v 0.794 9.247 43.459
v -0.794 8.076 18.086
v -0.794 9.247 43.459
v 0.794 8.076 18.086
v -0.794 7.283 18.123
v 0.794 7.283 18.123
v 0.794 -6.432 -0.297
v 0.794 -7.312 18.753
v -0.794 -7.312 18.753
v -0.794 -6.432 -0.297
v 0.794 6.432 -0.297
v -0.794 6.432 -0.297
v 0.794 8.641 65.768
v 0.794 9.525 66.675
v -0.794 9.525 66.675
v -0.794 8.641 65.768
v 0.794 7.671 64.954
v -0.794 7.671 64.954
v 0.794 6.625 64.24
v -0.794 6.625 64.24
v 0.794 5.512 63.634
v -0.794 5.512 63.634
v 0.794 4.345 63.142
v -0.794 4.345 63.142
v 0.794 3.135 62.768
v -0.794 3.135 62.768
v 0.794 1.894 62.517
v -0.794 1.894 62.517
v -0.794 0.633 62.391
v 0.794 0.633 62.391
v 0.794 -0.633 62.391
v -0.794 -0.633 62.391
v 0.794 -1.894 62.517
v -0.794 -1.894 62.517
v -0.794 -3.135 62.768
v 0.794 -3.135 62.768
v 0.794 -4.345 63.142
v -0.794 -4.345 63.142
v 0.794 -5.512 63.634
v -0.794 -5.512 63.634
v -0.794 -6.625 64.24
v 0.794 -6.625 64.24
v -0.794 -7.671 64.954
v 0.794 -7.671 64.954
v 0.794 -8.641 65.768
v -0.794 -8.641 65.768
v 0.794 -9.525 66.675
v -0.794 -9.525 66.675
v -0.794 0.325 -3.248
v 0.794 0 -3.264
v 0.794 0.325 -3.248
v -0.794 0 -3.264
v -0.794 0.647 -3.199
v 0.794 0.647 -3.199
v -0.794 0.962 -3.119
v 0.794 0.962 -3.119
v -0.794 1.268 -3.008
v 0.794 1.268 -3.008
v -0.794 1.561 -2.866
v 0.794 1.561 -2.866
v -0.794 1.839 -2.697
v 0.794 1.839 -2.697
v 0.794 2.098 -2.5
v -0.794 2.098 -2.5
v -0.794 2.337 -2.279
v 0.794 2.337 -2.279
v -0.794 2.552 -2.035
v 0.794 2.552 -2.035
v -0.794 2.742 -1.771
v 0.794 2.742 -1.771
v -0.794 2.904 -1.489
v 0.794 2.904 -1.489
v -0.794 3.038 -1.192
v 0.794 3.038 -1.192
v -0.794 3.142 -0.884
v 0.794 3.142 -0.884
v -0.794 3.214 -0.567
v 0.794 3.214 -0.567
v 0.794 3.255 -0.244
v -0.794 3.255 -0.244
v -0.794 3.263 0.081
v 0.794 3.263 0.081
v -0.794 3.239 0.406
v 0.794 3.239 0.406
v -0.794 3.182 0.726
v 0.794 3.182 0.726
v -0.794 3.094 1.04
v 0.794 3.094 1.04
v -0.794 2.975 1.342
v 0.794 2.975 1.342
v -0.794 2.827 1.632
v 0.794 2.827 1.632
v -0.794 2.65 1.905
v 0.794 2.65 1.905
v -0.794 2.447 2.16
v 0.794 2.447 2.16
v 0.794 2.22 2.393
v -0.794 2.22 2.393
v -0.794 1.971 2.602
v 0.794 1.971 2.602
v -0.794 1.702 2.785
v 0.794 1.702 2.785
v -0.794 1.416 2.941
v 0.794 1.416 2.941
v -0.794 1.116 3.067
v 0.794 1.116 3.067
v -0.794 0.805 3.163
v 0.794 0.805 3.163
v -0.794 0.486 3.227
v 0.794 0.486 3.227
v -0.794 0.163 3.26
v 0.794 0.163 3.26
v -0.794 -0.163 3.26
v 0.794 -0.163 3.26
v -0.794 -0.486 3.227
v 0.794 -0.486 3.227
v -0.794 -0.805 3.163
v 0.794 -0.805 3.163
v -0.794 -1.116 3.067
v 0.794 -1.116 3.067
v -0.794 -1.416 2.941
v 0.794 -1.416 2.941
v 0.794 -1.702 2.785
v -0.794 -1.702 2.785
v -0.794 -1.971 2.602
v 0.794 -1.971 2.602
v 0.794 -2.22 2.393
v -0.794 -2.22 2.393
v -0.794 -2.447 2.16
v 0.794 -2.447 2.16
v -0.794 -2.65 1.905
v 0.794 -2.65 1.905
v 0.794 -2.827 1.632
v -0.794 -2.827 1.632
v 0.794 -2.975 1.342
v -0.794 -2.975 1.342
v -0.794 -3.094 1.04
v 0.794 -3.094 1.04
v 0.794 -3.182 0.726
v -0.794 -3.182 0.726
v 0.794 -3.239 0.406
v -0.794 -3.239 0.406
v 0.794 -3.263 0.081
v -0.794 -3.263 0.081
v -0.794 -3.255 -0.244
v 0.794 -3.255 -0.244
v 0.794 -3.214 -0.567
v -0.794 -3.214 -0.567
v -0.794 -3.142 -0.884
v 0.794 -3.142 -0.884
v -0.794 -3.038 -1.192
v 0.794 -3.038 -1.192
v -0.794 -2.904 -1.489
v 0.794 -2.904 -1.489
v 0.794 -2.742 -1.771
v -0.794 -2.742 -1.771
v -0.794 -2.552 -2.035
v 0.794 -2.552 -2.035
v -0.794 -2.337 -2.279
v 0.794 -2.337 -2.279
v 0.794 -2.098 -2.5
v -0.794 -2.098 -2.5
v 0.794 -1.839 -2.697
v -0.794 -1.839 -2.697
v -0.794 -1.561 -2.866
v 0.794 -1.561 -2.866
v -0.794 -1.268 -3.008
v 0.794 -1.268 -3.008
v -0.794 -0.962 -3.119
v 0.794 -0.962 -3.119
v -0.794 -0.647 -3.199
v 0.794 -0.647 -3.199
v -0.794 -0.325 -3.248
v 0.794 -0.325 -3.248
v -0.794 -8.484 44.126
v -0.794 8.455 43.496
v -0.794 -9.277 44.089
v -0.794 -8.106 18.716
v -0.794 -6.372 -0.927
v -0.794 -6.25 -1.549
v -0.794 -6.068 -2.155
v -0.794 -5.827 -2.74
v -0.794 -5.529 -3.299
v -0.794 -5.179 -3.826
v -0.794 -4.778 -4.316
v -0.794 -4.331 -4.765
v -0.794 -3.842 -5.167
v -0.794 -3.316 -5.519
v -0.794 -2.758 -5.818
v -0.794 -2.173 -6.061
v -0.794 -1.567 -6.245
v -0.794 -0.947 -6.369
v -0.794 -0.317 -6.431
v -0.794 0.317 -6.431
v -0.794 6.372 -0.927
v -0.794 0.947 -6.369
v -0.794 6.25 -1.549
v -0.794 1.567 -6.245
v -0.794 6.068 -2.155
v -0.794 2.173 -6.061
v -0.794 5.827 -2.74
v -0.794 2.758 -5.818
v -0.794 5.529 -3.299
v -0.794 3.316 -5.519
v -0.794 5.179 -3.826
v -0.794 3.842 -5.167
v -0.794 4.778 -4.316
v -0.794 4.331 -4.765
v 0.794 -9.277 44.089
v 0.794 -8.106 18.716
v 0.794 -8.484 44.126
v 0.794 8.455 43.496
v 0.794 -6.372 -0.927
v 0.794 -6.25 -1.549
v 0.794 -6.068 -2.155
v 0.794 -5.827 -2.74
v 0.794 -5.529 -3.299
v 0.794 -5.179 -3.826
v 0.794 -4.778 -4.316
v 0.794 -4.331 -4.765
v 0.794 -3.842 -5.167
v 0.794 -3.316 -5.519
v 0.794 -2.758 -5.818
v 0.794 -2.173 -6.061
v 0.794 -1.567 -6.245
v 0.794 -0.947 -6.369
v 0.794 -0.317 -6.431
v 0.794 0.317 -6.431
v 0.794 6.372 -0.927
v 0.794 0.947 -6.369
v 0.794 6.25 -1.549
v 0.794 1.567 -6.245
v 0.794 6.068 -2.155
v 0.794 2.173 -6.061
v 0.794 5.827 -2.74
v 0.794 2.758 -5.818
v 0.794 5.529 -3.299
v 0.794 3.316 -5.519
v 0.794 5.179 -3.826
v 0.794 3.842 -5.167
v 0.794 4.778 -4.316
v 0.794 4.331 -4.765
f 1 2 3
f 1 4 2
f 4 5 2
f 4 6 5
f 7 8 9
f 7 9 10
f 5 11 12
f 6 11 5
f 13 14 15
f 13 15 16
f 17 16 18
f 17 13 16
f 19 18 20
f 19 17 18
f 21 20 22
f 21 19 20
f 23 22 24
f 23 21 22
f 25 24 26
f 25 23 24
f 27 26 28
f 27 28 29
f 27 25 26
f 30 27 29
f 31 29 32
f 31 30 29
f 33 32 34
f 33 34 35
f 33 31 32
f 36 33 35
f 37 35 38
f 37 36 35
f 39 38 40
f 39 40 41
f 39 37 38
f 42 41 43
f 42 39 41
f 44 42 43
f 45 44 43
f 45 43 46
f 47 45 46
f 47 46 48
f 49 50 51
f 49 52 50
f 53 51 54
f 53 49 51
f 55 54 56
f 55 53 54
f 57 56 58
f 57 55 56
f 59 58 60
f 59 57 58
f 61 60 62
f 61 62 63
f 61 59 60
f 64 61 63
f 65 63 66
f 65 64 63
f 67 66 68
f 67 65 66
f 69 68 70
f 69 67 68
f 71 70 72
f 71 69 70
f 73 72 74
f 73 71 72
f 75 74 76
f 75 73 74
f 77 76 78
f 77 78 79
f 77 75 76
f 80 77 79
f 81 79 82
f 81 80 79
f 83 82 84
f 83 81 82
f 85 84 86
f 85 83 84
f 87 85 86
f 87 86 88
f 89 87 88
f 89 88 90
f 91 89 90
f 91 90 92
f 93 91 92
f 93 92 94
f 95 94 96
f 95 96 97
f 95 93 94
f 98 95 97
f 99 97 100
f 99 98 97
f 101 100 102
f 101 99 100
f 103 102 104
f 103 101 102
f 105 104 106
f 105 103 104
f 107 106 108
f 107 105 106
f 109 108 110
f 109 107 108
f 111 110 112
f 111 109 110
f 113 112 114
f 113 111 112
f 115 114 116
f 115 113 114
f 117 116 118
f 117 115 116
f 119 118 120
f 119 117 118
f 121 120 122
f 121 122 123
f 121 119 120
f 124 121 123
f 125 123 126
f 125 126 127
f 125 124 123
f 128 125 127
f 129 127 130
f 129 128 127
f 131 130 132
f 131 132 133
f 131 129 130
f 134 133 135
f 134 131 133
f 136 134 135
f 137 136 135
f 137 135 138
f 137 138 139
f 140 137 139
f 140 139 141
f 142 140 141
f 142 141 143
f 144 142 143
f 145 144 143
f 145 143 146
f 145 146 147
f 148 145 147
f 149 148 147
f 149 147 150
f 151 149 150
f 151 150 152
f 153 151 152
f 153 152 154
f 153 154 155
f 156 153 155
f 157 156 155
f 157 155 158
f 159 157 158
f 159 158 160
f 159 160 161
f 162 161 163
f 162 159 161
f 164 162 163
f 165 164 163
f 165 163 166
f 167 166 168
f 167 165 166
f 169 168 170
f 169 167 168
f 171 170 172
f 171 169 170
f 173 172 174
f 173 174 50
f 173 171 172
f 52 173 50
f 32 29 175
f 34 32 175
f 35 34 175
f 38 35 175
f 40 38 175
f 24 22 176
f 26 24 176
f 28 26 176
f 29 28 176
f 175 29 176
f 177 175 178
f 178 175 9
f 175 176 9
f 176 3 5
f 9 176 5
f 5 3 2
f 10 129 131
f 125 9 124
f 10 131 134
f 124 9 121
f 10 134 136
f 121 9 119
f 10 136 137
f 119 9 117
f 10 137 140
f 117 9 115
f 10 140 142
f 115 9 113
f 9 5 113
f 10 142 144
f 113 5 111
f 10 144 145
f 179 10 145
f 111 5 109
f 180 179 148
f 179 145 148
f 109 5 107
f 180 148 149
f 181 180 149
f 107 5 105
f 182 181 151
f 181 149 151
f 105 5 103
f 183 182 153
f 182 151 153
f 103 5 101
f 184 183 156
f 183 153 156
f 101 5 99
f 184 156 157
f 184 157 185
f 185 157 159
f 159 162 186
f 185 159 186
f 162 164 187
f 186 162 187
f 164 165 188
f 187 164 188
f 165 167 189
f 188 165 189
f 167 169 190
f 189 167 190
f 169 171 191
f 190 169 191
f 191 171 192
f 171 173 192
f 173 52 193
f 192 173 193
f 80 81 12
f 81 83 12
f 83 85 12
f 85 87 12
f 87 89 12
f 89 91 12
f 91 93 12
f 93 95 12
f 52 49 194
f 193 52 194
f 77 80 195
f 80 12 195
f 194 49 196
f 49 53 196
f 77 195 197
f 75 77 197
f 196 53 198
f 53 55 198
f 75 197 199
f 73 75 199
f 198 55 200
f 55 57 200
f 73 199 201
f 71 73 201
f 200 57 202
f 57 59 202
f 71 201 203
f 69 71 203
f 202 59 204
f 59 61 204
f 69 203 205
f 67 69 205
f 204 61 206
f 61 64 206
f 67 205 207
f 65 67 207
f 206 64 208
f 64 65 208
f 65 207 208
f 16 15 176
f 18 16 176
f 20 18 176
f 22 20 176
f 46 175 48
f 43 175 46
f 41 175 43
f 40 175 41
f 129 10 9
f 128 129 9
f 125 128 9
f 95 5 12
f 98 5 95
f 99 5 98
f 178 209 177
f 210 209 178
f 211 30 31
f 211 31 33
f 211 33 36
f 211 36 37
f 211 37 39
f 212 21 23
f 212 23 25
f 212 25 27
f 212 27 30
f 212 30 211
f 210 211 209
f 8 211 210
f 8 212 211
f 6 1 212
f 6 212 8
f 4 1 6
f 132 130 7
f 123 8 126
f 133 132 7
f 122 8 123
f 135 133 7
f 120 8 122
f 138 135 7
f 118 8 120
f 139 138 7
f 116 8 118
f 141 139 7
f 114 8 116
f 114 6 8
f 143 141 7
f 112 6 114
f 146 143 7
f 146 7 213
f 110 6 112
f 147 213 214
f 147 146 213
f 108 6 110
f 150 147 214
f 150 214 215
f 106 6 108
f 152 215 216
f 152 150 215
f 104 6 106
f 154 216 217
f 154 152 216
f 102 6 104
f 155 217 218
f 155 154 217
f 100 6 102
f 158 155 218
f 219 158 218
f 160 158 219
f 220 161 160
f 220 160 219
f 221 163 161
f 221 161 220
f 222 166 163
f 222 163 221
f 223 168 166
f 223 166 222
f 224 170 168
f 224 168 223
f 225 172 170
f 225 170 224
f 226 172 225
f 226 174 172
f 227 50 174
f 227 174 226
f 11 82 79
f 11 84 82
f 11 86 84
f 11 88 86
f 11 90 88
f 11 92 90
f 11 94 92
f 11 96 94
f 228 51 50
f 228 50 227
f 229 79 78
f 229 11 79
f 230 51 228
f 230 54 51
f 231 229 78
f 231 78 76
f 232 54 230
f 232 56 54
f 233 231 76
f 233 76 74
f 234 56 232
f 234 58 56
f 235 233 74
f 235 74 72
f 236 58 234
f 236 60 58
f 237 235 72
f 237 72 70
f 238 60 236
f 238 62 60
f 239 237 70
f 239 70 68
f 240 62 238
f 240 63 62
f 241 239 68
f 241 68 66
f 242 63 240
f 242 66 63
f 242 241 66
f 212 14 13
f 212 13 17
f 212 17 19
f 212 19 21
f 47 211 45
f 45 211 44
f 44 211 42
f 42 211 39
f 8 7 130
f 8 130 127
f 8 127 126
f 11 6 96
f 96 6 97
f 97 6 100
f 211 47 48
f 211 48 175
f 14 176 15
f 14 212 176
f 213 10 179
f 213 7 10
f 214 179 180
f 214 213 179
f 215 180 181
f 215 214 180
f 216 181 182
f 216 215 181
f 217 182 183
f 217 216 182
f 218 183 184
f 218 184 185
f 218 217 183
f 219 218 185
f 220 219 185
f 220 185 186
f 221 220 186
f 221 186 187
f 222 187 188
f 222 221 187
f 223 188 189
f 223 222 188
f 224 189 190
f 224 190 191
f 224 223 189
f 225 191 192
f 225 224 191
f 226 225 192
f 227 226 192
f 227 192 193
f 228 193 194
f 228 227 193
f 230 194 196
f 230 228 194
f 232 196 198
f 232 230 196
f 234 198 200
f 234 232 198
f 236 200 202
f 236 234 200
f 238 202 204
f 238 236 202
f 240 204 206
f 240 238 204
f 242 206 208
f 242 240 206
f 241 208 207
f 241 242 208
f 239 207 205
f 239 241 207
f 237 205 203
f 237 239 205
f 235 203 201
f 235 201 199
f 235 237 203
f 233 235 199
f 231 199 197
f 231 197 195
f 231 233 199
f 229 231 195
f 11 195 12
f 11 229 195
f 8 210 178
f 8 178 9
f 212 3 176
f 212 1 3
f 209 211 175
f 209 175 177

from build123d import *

# Parameters (mm, degrees)
SKETCH1_R           = 3.2639
BOSS_EXTRUDE1_DEPTH = 0.79375


with BuildPart() as part:
    # Sketch1 → Boss-Extrude1 (new, symmetric)
    with BuildSketch(Plane(origin=(0, 0, 0), x_dir=(0, 0, -1), z_dir=(1, 0, 0))):
        with BuildLine():
            Line((-43.495639045, 8.454512603), (-66.675, 9.525))
            ThreePointArc((-66.675, 9.525), (-62.375260413, 0), (-66.675, -9.525))
            Line((-66.675, -9.525), (-44.125906356, -8.483620102))
            Line((-44.125906356, -8.483620102), (-44.089248772, -9.277370102))
            Line((-44.089248772, -9.277370102), (-18.716292707, -8.105576378))
            Line((-18.716292707, -8.105576378), (-18.752950291, -7.311826378))
            Line((-18.752950291, -7.311826378), (0.297049709, -6.432044362))
            ThreePointArc((0.297049709, -6.432044362), (6.4389, 0), (0.297049709, 6.432044362))
            Line((0.297049709, 6.432044362), (-18.12268298, 7.28271888))
            Line((-18.12268298, 7.28271888), (-18.086064426, 8.075623757))
            Line((-18.086064426, 8.075623757), (-43.459020491, 9.24741748))
            Line((-43.459020491, 9.24741748), (-43.495639045, 8.454512603))
        make_face()
        Circle(SKETCH1_R, mode=Mode.SUBTRACT)
    extrude(amount=BOSS_EXTRUDE1_DEPTH, both=True)


solid = part.part
